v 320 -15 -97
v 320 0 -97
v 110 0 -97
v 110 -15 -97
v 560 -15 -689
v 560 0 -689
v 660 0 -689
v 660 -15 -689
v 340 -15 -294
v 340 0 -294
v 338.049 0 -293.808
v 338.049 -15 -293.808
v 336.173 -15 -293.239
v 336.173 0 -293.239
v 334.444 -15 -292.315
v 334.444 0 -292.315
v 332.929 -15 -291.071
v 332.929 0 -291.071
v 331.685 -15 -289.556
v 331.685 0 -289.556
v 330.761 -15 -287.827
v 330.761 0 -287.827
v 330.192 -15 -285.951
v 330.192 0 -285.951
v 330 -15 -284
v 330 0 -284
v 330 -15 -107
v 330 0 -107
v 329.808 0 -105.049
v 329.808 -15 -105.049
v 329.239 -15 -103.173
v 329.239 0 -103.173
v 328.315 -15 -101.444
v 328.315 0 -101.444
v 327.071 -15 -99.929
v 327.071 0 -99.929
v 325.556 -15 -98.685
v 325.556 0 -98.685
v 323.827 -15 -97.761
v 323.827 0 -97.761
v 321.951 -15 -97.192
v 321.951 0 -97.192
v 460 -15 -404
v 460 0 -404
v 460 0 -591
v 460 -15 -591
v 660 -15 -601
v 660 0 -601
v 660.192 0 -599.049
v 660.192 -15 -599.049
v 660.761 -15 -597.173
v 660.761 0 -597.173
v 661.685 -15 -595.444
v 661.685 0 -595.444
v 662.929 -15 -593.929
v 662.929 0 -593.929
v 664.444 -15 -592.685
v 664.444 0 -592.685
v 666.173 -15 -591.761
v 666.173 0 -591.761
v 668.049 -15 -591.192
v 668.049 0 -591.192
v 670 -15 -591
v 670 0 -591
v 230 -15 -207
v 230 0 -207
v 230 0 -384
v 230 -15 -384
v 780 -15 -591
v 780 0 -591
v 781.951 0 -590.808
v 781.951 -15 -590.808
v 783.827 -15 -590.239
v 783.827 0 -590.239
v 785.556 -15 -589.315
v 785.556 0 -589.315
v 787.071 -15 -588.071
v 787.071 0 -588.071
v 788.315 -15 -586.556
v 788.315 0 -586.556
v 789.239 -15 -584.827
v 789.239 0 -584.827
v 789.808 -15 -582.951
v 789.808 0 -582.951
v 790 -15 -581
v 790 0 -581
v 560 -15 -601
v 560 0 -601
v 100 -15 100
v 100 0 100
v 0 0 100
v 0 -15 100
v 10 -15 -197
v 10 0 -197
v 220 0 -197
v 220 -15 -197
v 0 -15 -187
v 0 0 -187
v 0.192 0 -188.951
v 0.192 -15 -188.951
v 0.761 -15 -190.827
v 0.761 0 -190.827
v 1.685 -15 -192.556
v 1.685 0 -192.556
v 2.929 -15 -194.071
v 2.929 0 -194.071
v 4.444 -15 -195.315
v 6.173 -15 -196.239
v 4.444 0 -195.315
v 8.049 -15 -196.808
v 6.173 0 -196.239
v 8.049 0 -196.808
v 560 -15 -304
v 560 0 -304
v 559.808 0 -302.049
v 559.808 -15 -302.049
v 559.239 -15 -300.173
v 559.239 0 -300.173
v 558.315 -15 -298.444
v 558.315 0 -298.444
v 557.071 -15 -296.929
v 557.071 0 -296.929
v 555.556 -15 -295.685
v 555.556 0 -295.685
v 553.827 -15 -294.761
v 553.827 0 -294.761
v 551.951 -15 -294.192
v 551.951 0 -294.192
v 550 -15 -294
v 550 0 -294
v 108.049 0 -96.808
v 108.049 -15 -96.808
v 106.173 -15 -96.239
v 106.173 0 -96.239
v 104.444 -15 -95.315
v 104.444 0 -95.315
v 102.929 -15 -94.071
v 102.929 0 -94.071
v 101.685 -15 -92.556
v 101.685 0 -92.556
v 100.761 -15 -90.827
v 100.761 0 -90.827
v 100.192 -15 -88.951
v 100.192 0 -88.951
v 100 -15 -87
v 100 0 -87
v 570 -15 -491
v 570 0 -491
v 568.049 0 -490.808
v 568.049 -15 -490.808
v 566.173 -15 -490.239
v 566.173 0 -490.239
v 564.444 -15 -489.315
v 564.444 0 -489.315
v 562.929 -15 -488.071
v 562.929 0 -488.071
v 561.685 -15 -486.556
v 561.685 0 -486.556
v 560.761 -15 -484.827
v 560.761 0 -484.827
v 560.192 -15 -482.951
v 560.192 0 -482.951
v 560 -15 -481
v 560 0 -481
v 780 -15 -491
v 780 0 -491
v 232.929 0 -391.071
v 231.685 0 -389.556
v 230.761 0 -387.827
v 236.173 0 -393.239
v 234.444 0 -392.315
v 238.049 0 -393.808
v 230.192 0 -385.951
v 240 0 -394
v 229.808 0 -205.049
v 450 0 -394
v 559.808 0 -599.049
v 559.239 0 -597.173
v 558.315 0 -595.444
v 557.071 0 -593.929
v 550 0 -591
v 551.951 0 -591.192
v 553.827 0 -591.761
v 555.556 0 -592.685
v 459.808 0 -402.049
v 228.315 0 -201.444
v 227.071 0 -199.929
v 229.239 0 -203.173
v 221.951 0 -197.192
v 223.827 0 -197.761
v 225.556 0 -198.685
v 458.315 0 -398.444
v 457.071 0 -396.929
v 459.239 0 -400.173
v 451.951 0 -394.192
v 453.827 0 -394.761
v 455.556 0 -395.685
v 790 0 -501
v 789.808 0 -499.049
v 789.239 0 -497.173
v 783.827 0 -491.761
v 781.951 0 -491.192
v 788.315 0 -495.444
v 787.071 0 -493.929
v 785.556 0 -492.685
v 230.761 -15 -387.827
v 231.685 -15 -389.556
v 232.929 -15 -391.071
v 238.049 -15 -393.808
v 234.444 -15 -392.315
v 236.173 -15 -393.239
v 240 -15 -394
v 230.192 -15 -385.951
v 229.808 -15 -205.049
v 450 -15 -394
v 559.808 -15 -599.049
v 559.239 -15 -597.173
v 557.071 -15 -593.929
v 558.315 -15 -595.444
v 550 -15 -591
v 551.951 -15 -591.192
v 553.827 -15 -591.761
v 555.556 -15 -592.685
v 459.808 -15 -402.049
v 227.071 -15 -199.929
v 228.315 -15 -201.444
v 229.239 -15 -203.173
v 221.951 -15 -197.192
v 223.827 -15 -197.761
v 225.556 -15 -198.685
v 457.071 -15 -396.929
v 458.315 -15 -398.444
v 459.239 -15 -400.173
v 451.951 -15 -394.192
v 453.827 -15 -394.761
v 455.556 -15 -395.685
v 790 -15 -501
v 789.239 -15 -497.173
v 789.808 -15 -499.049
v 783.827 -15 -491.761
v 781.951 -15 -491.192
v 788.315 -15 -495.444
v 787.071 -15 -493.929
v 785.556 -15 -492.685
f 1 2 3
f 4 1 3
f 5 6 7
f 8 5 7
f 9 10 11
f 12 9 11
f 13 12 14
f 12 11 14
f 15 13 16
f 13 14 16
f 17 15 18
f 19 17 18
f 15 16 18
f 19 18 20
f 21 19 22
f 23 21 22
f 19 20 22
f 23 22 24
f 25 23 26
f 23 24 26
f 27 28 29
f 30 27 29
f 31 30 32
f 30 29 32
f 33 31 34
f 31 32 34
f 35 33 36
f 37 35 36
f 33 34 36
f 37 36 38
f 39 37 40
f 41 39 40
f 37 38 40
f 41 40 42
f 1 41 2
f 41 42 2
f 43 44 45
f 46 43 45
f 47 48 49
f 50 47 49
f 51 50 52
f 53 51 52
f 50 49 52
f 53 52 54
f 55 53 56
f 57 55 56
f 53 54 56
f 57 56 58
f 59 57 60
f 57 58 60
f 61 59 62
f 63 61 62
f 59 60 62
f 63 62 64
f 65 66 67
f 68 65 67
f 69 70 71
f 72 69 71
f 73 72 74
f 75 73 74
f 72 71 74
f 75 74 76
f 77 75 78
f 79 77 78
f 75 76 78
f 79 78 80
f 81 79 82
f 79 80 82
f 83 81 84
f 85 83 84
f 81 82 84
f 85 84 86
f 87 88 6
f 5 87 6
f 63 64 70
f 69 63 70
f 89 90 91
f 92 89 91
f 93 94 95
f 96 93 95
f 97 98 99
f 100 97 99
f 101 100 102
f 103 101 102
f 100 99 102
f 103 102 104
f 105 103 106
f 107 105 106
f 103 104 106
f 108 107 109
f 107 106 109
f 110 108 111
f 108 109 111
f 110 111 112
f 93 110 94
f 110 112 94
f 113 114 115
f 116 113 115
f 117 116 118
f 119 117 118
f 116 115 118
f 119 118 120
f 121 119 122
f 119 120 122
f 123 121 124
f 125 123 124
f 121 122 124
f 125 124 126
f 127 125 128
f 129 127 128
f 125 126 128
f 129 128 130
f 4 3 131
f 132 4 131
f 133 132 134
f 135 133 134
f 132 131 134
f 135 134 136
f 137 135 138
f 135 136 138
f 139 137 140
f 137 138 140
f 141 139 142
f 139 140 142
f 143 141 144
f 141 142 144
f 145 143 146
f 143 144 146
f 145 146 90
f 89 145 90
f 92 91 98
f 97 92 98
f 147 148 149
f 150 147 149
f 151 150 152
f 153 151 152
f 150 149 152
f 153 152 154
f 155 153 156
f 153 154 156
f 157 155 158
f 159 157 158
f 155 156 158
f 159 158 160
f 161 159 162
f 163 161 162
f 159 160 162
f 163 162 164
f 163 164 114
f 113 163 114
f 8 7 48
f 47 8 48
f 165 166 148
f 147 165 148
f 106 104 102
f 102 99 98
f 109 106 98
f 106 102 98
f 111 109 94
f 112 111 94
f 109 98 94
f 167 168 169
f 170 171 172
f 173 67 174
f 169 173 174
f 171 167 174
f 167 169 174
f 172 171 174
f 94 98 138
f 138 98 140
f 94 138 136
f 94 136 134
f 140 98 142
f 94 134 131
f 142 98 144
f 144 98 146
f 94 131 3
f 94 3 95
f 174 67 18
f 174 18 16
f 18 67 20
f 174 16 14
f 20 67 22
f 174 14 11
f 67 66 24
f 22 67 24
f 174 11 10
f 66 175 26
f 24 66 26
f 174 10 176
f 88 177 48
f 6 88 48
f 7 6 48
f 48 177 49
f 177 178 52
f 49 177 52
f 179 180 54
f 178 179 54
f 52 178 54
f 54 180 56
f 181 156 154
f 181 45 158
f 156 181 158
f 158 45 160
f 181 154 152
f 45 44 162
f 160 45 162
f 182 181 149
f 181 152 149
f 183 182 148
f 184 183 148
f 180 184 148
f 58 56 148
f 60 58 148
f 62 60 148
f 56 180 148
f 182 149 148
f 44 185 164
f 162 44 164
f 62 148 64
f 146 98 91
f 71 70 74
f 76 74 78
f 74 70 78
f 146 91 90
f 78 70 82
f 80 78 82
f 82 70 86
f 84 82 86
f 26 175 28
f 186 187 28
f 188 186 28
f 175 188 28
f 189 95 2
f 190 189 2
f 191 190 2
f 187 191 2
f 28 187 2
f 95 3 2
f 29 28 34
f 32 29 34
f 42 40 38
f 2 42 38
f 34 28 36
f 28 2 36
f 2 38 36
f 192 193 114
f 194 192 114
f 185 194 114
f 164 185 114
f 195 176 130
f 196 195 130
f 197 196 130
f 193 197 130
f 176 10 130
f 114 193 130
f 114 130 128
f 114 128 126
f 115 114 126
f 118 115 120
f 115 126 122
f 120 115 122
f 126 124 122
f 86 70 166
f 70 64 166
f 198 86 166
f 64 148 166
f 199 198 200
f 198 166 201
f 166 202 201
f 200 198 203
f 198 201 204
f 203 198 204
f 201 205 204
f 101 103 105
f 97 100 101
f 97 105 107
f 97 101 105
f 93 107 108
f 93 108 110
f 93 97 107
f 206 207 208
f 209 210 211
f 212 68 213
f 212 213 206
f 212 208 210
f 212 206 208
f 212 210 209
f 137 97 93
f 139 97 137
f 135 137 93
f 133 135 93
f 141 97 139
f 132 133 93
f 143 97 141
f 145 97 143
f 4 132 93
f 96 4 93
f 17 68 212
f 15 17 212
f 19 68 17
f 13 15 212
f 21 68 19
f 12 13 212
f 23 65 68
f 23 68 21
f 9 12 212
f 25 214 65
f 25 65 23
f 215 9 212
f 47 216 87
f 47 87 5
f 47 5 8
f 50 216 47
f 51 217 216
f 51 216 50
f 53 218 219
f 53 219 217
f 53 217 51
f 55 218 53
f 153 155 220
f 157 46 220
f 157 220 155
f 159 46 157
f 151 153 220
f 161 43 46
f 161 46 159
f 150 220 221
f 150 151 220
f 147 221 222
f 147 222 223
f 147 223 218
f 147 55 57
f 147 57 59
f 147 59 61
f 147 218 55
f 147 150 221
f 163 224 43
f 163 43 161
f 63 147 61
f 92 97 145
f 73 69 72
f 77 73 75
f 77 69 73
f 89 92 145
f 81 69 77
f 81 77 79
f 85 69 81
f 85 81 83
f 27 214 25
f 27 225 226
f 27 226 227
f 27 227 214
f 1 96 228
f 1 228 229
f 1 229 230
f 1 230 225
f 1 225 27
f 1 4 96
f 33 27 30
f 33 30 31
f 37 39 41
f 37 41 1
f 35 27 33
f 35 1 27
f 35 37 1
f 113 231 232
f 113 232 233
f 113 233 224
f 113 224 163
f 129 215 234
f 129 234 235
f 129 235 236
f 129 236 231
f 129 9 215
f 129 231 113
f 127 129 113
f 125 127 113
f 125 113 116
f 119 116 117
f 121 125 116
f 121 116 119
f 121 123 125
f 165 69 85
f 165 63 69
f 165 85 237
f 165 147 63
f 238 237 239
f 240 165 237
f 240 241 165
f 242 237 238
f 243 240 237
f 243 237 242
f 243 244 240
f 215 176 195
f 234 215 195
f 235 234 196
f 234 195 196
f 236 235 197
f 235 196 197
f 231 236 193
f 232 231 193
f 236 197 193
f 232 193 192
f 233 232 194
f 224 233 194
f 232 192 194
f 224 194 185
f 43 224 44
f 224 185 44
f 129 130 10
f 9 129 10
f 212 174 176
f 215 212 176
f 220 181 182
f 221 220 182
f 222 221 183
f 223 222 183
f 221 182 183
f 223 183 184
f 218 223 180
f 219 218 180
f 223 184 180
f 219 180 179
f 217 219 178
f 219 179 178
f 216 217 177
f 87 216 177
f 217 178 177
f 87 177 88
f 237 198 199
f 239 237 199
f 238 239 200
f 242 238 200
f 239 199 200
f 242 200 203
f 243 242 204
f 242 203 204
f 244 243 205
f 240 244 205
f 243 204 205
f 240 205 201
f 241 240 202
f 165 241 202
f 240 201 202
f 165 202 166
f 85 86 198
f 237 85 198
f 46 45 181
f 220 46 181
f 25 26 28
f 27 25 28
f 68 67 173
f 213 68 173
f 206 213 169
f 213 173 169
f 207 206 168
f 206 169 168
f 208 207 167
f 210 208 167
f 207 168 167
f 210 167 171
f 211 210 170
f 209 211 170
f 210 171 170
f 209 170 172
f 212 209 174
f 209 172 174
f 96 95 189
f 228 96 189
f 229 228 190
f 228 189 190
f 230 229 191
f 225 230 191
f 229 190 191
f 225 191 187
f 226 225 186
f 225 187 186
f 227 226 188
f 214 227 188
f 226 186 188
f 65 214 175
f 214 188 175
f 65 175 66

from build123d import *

# Parameters (mm, degrees)
F1_DEPTH = 15


with BuildPart() as f1:
    # F0 (on Front) → F1 (new body)
    with BuildSketch(Plane.XZ):
        with BuildLine():
            Line((100, -87), (100, 100))
            Line((100, 100), (0, 100))
            Line((0, 100), (0, -187))
            ThreePointArc((0, -187), (2.928932, -194.071068), (10, -197))
            Line((10, -197), (220, -197))
            ThreePointArc((220, -197), (227.071068, -199.928932), (230, -207))
            Line((230, -207), (230, -384))
            ThreePointArc((230, -384), (232.928932, -391.071068), (240, -394))
            Line((240, -394), (450, -394))
            ThreePointArc((450, -394), (457.071068, -396.928932), (460, -404))
            Line((460, -404), (460, -591))
            Line((460, -591), (550, -591))
            ThreePointArc((550, -591), (557.071068, -593.928932), (560, -601))
            Line((560, -601), (560, -689))
            Line((560, -689), (660, -689))
            Line((660, -689), (660, -601))
            ThreePointArc((660, -601), (662.928932, -593.928932), (670, -591))
            Line((670, -591), (780, -591))
            ThreePointArc((780, -591), (787.071068, -588.071068), (790, -581))
            Line((790, -581), (790, -501))
            ThreePointArc((790, -501), (787.071068, -493.928932), (780, -491))
            Line((780, -491), (570, -491))
            ThreePointArc((570, -491), (562.928932, -488.071068), (560, -481))
            Line((560, -481), (560, -304))
            ThreePointArc((560, -304), (557.071068, -296.928932), (550, -294))
            Line((550, -294), (340, -294))
            ThreePointArc((340, -294), (332.928932, -291.071068), (330, -284))
            Line((330, -284), (330, -107))
            ThreePointArc((330, -107), (327.071068, -99.928932), (320, -97))
            Line((320, -97), (110, -97))
            ThreePointArc((110, -97), (102.928932, -94.071068), (100, -87))
        make_face()
    extrude(amount=F1_DEPTH)


solid = f1.part
